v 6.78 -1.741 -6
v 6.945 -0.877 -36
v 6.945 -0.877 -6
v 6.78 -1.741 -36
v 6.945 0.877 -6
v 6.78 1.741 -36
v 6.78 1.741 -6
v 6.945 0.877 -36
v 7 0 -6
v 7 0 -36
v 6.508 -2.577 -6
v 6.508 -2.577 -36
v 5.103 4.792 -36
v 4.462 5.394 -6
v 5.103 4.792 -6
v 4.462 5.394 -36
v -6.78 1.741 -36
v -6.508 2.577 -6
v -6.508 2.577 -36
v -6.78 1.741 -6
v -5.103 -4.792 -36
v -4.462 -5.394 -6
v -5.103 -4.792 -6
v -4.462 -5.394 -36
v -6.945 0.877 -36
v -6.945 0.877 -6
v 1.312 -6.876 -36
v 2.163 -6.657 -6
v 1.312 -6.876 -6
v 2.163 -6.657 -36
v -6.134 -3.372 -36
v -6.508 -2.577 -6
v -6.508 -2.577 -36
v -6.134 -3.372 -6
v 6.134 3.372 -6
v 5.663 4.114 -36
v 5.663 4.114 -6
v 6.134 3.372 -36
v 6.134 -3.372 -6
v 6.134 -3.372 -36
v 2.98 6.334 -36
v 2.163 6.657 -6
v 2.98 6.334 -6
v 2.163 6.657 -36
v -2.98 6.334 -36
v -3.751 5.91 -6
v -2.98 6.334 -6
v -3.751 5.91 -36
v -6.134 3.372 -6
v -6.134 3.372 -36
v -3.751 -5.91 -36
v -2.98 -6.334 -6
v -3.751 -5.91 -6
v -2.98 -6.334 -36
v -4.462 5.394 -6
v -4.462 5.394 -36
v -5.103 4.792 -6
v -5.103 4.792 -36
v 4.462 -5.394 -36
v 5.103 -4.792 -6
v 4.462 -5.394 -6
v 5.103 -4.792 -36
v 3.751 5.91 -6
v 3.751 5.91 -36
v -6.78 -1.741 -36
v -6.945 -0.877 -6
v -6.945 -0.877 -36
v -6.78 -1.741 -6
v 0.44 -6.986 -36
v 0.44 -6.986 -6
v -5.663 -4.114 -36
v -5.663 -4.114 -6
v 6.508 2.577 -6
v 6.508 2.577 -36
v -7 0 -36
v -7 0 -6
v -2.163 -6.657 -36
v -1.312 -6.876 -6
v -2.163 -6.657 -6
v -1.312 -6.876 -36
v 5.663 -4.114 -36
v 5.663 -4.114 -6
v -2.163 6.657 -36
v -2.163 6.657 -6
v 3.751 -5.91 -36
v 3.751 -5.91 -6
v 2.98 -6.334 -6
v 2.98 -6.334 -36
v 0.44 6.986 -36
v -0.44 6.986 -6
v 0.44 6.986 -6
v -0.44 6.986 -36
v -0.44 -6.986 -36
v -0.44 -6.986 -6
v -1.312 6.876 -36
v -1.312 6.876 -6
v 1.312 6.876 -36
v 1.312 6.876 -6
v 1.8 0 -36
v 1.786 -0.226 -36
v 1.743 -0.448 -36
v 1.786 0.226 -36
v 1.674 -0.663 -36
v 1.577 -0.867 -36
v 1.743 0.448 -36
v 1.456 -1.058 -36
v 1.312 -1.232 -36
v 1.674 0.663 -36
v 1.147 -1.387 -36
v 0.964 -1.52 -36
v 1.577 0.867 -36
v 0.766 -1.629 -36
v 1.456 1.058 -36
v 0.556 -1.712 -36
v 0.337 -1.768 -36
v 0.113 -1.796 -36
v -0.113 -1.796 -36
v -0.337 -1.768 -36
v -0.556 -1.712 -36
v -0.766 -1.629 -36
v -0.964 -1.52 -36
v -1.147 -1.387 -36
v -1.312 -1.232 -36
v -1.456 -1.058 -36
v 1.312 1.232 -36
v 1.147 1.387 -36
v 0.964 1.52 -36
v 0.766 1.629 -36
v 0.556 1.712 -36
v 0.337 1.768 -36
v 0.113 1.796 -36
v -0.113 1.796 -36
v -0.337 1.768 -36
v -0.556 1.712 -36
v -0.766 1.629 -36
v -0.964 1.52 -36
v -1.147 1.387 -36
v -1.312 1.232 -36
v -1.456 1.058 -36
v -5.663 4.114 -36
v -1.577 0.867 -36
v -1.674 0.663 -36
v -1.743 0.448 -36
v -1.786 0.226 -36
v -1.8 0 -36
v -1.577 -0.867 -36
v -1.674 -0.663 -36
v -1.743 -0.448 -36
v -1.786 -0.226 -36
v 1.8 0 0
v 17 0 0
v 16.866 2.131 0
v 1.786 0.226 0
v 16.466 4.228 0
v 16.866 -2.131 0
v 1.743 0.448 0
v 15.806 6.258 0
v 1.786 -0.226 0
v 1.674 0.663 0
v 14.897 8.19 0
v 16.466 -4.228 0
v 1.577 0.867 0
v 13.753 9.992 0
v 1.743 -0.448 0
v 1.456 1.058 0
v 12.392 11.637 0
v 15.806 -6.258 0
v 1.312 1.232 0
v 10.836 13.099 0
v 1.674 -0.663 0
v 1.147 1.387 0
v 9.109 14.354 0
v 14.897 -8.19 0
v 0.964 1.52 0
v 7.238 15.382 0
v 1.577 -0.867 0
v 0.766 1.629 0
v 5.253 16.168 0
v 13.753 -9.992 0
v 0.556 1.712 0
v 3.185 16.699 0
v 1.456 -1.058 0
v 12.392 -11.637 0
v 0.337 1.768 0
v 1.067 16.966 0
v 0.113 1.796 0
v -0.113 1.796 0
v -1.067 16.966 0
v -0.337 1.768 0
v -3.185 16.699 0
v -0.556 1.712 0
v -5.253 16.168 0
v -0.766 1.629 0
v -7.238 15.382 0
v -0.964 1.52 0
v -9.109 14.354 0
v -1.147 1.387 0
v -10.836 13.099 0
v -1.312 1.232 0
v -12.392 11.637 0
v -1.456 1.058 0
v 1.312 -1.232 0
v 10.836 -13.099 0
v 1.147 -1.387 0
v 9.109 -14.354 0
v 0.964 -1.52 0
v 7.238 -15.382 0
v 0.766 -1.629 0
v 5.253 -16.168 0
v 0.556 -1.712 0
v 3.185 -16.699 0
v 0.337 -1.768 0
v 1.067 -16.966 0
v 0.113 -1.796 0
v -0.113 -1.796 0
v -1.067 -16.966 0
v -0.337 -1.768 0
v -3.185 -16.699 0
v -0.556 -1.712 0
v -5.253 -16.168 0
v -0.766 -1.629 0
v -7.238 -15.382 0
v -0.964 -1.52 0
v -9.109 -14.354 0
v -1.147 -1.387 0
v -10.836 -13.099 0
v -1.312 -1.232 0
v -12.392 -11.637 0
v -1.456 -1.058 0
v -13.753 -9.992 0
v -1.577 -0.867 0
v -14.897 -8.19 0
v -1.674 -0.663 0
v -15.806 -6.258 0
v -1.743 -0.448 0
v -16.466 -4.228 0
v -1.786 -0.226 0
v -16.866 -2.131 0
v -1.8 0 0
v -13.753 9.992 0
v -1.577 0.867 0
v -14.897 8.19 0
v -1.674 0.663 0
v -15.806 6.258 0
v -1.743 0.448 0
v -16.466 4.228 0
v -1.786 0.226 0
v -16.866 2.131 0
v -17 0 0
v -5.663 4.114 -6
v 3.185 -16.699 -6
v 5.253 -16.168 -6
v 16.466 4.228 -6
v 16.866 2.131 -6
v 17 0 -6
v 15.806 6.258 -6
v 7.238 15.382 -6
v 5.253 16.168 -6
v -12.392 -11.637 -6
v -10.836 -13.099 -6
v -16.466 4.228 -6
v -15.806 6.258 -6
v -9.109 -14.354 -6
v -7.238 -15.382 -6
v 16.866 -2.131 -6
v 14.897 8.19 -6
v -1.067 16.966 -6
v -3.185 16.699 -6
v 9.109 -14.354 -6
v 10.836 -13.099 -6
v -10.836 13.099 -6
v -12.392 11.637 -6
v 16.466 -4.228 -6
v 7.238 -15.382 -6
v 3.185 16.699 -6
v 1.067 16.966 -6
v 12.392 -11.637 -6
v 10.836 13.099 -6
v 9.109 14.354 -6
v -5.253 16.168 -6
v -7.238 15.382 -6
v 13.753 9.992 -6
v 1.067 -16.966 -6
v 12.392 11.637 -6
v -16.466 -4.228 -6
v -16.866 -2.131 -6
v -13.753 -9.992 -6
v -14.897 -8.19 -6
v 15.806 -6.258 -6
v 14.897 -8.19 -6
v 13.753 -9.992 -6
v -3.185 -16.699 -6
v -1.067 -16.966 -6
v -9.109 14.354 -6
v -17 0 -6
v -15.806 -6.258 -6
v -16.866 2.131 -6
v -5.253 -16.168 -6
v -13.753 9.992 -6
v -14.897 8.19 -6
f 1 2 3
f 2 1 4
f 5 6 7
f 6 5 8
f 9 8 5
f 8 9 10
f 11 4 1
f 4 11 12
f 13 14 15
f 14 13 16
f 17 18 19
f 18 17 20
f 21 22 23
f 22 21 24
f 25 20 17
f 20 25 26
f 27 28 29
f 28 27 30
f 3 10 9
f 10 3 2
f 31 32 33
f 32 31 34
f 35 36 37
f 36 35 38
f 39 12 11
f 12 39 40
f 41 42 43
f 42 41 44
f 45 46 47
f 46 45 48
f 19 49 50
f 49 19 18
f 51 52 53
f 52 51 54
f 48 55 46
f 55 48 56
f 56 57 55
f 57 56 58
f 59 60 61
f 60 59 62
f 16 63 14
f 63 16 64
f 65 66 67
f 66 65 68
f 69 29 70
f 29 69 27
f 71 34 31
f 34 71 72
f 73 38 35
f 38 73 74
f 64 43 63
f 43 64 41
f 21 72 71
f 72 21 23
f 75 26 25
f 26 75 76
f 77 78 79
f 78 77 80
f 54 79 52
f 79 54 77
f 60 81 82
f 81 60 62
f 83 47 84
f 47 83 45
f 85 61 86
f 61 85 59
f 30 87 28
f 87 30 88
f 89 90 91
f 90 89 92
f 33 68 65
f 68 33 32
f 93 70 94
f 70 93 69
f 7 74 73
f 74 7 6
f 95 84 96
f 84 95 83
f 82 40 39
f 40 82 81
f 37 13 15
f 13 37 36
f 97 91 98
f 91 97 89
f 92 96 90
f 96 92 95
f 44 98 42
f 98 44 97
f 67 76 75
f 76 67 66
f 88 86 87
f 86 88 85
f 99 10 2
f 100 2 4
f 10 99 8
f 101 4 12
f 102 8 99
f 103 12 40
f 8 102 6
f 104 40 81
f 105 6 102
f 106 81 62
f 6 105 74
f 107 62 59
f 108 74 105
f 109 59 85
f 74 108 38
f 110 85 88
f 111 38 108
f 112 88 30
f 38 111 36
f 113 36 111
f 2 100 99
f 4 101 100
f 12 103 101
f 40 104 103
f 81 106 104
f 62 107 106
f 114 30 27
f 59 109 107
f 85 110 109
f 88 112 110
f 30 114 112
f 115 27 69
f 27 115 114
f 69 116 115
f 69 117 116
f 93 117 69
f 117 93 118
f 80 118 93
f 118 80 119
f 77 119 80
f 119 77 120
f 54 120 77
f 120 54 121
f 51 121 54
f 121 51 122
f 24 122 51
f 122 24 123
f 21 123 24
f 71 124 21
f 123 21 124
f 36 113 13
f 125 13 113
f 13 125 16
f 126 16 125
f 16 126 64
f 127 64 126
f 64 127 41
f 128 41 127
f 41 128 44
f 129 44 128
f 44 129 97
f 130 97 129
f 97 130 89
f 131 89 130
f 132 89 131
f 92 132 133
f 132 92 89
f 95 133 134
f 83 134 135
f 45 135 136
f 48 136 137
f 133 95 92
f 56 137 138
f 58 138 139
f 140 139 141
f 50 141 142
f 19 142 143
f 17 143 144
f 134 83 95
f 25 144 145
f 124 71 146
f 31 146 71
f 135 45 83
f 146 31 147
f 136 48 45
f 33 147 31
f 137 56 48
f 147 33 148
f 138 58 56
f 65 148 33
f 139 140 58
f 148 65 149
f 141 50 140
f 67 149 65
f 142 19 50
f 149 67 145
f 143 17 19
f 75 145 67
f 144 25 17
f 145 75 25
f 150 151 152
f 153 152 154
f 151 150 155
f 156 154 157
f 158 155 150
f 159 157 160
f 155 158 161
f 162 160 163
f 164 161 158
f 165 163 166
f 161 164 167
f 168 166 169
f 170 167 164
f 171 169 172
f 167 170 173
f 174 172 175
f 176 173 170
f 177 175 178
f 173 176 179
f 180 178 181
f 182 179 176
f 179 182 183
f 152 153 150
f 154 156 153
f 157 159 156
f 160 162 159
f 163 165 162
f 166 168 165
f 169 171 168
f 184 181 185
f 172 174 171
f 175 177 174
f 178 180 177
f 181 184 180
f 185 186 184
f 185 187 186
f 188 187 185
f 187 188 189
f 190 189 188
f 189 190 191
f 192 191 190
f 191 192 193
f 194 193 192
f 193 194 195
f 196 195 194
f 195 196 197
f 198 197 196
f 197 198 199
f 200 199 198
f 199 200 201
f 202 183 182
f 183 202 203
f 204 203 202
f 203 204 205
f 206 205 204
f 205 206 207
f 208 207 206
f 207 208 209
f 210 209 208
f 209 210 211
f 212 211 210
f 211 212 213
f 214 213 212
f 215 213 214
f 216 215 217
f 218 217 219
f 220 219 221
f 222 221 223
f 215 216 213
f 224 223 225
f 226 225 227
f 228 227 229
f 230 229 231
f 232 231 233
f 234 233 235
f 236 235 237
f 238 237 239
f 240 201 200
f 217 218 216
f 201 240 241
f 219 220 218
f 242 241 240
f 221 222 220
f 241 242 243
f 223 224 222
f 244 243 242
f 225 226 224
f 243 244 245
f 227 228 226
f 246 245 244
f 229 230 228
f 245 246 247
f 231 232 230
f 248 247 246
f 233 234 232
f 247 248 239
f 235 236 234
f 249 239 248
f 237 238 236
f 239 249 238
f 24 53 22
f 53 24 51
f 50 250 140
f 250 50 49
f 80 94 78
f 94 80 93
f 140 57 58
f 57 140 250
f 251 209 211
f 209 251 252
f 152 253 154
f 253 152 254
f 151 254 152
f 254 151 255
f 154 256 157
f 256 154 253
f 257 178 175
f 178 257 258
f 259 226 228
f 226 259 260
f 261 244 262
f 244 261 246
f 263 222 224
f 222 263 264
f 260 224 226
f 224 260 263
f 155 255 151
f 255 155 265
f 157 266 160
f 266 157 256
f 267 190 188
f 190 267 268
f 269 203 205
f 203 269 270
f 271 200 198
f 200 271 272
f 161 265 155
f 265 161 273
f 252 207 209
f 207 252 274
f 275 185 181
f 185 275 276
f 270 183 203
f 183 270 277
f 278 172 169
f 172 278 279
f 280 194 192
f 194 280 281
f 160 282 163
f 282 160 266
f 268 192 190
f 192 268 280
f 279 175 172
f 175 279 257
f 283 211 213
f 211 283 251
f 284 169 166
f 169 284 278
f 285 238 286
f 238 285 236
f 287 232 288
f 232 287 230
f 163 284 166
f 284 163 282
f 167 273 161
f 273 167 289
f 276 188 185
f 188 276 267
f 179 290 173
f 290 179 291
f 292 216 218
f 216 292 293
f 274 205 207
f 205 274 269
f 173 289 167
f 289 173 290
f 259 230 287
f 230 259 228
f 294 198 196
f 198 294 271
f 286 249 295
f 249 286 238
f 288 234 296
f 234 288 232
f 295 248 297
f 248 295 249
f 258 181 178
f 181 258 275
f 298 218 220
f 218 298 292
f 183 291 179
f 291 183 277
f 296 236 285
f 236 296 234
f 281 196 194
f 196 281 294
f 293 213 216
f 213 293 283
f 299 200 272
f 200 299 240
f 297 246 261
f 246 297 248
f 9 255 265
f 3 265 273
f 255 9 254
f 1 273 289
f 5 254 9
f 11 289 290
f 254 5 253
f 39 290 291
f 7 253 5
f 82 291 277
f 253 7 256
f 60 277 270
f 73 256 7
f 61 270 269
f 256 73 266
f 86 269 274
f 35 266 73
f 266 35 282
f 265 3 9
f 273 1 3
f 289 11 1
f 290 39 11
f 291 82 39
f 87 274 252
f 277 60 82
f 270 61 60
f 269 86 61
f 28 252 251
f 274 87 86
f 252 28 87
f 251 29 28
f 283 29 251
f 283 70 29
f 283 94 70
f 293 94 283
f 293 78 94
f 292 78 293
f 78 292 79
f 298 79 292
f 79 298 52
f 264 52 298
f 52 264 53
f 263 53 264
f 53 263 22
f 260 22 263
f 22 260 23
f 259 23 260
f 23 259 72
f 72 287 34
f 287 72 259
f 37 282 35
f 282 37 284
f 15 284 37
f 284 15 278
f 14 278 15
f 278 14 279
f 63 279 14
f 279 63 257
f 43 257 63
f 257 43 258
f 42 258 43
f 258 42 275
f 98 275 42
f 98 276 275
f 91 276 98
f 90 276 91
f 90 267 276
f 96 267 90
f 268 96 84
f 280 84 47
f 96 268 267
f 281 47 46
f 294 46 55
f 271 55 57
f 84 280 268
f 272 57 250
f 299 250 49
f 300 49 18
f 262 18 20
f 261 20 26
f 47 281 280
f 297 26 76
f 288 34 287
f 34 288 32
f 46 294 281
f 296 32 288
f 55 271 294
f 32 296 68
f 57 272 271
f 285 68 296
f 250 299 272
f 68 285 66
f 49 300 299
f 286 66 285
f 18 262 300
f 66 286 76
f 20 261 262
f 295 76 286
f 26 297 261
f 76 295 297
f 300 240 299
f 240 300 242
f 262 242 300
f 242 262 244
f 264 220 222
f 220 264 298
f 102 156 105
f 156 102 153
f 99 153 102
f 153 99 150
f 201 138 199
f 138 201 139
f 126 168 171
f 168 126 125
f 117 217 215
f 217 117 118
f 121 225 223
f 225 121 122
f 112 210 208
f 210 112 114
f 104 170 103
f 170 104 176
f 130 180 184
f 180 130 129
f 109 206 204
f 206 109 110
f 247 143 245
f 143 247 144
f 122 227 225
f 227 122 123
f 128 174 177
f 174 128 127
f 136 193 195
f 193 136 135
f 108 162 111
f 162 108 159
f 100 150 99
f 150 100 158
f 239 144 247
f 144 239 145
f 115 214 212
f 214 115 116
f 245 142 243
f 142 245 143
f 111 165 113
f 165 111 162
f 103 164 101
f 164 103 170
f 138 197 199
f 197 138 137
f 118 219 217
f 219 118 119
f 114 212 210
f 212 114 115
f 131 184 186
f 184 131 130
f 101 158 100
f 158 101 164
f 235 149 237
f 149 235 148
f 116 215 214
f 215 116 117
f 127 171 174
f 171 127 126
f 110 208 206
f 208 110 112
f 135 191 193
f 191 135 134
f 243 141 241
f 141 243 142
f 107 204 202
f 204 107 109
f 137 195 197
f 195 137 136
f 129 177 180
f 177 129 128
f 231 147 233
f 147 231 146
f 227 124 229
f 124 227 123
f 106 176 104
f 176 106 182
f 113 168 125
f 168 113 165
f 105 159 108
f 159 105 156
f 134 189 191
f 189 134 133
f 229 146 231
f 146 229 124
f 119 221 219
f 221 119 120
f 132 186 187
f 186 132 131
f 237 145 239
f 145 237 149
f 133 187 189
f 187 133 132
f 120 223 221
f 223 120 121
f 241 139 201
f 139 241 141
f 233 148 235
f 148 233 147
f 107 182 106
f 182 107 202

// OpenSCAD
$fn = 50;


difference() {
	union() {
		translate(v = [0, 0, -36.0000000000]) {
			cylinder(h = 36, r = 7.0000000000);
		}
		translate(v = [0, 0, -6.0000000000]) {
			cylinder(h = 6, r = 17.0000000000);
		}
	}
	union() {
		#translate(v = [0, 0, -36]) {
			cylinder(h = 36, r = 1.8000000000);
		}
	}
}
